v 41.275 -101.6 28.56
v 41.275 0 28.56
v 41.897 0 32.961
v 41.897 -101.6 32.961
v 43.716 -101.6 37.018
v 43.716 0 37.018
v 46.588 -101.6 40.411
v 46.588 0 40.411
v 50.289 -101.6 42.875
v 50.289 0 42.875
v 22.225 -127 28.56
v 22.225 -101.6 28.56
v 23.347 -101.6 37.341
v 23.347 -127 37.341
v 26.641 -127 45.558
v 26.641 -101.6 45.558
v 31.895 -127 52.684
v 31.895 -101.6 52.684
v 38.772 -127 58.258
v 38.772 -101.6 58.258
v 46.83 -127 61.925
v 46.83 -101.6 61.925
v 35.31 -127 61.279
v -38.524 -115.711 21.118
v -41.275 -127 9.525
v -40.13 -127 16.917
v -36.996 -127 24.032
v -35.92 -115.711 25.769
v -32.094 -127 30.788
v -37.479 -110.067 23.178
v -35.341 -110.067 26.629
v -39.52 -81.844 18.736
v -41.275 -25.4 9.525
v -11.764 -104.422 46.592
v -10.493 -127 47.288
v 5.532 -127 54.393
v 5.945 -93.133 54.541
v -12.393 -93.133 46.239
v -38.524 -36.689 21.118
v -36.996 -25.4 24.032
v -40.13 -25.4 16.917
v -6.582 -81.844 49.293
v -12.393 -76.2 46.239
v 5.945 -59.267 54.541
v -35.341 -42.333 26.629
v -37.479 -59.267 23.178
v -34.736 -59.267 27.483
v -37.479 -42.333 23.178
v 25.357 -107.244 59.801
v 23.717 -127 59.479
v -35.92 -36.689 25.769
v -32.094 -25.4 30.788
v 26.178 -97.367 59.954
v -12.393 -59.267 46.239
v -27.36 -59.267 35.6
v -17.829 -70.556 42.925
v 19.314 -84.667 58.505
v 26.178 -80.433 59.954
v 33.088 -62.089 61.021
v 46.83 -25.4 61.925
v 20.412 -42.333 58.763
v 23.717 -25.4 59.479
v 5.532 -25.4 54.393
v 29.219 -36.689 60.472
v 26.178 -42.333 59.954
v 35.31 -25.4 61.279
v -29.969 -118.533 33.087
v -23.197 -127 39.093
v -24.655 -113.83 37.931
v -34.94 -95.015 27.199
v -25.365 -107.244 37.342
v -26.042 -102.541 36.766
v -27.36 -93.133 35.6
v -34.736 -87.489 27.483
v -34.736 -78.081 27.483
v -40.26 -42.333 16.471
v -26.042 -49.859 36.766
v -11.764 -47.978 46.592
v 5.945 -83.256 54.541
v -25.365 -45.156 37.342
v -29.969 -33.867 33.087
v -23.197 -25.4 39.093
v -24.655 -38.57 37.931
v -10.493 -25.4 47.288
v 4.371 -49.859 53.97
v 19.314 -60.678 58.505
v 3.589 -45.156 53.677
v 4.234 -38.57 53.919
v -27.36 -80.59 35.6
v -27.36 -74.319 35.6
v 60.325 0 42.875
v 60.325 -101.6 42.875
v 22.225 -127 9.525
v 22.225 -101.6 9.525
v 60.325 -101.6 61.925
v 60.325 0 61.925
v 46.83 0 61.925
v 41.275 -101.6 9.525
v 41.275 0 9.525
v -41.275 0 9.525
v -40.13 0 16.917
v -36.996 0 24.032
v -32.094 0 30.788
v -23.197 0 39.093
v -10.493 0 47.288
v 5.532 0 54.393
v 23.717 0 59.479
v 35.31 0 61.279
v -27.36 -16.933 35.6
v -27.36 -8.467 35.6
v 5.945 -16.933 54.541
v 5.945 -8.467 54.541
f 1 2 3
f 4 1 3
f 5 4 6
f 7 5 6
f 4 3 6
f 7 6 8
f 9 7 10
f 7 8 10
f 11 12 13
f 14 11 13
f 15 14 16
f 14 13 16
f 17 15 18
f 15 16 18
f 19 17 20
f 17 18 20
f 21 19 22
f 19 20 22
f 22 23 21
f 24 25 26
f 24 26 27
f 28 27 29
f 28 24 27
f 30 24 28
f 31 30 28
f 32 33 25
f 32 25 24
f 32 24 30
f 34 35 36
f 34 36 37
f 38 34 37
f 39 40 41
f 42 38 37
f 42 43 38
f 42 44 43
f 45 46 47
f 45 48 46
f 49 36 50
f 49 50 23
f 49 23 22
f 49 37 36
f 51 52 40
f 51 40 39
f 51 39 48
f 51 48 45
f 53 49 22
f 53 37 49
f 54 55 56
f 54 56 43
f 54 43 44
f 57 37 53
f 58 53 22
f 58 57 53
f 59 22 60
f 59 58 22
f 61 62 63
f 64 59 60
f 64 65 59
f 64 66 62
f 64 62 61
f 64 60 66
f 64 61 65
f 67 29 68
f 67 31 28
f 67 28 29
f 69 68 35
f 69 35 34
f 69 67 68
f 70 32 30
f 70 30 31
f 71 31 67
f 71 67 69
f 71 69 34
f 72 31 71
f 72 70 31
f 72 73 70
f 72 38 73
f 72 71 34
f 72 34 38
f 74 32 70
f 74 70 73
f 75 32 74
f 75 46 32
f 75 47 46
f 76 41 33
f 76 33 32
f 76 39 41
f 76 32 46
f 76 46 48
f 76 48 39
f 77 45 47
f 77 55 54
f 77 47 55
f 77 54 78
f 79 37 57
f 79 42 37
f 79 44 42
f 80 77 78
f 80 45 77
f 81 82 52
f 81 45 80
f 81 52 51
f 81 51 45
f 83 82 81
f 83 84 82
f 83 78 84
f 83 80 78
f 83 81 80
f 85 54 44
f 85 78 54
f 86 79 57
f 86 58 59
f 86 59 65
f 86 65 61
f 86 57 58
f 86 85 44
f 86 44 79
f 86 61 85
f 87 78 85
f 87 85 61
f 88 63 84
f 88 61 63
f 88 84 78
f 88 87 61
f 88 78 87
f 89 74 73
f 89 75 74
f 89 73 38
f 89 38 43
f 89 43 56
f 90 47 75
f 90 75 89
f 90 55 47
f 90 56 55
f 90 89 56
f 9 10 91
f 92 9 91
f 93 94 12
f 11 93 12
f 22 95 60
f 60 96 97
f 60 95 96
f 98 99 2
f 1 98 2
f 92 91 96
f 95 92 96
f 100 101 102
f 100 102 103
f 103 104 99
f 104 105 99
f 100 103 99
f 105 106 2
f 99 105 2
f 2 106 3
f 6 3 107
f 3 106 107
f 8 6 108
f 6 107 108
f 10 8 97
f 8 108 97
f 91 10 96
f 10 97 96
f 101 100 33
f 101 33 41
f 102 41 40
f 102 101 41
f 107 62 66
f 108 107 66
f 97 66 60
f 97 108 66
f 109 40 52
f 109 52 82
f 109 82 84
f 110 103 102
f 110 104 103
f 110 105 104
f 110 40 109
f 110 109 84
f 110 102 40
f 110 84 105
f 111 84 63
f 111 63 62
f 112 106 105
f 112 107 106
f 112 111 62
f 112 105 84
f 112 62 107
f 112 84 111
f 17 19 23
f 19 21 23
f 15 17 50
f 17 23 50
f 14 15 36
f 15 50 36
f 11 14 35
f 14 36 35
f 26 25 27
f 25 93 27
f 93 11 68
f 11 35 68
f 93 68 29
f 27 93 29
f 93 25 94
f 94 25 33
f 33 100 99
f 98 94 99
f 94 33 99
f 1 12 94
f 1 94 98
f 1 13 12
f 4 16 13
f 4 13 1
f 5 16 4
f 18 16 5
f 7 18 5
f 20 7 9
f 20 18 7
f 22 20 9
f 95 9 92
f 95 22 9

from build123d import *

# Parameters (mm, degrees)
F1_DEPTH = 25.4
F2_DEPTH = 101.6
F3_DEPTH = 101.6


with BuildPart() as f1:
    # F0 (on Front) → F1 (new body)
    with BuildSketch(Plane.XZ):
        with BuildLine():
            add(Edge.make_bspline(
                [(-41.275, 9.525), (-40.990595, 37.692979), (6.090595, 61.794065), (46.830385, 61.9252)],
                knots=[0, 0, 0, 0, 102.510194, 102.510194, 102.510194, 102.510194], degree=3))
            Line((-41.275, 9.525), (22.225, 9.525))
            Line((22.225, 9.525), (22.225, 28.559631))
            ThreePointArc((22.225, 28.559631), (29.041566, 49.288151), (46.830385, 61.9252))
        make_face()
    extrude(amount=F1_DEPTH)

    # F1_face (on face) → F2 (join)
    with BuildSketch(Plane(origin=(-1.16305, -25.4, 31.053726), x_dir=(1, 0, 0), z_dir=(0, -1, 0))):
        with BuildLine():
            add(Edge.make_bspline(
                [(-40.11195, -21.528726), (-39.827545, 6.639253), (7.253645, 30.740339), (47.993435, 30.871474)],
                knots=[0, 0, 0, 0, 102.510194, 102.510194, 102.510194, 102.510194], degree=3))
            Line((-40.11195, -21.528726), (23.38805, -21.528726))
            Line((23.38805, -21.528726), (23.38805, -2.494095))
            ThreePointArc((23.38805, -2.494095), (30.204616, 18.234425), (47.993435, 30.871474))
        make_face()
    extrude(amount=F2_DEPTH)

    # F0 (on Front) → F3 (join)
    with BuildSketch(Plane.XZ):
        with BuildLine():
            Line((22.225, 28.559631), (22.225, 9.525))
            Line((22.225, 9.525), (41.275, 9.525))
            Line((41.275, 9.525), (41.275, 28.559631))
            ThreePointArc((41.275, 28.559631), (43.716053, 37.018041), (50.288505, 42.8752))
            Line((50.288505, 42.8752), (60.325, 42.8752))
            Line((60.325, 42.8752), (60.325, 61.9252))
            Line((60.325, 61.9252), (46.830385, 61.9252))
            ThreePointArc((46.830385, 61.9252), (29.041566, 49.288151), (22.225, 28.559631))
        make_face()
    extrude(amount=F3_DEPTH)


solid = f1.part
